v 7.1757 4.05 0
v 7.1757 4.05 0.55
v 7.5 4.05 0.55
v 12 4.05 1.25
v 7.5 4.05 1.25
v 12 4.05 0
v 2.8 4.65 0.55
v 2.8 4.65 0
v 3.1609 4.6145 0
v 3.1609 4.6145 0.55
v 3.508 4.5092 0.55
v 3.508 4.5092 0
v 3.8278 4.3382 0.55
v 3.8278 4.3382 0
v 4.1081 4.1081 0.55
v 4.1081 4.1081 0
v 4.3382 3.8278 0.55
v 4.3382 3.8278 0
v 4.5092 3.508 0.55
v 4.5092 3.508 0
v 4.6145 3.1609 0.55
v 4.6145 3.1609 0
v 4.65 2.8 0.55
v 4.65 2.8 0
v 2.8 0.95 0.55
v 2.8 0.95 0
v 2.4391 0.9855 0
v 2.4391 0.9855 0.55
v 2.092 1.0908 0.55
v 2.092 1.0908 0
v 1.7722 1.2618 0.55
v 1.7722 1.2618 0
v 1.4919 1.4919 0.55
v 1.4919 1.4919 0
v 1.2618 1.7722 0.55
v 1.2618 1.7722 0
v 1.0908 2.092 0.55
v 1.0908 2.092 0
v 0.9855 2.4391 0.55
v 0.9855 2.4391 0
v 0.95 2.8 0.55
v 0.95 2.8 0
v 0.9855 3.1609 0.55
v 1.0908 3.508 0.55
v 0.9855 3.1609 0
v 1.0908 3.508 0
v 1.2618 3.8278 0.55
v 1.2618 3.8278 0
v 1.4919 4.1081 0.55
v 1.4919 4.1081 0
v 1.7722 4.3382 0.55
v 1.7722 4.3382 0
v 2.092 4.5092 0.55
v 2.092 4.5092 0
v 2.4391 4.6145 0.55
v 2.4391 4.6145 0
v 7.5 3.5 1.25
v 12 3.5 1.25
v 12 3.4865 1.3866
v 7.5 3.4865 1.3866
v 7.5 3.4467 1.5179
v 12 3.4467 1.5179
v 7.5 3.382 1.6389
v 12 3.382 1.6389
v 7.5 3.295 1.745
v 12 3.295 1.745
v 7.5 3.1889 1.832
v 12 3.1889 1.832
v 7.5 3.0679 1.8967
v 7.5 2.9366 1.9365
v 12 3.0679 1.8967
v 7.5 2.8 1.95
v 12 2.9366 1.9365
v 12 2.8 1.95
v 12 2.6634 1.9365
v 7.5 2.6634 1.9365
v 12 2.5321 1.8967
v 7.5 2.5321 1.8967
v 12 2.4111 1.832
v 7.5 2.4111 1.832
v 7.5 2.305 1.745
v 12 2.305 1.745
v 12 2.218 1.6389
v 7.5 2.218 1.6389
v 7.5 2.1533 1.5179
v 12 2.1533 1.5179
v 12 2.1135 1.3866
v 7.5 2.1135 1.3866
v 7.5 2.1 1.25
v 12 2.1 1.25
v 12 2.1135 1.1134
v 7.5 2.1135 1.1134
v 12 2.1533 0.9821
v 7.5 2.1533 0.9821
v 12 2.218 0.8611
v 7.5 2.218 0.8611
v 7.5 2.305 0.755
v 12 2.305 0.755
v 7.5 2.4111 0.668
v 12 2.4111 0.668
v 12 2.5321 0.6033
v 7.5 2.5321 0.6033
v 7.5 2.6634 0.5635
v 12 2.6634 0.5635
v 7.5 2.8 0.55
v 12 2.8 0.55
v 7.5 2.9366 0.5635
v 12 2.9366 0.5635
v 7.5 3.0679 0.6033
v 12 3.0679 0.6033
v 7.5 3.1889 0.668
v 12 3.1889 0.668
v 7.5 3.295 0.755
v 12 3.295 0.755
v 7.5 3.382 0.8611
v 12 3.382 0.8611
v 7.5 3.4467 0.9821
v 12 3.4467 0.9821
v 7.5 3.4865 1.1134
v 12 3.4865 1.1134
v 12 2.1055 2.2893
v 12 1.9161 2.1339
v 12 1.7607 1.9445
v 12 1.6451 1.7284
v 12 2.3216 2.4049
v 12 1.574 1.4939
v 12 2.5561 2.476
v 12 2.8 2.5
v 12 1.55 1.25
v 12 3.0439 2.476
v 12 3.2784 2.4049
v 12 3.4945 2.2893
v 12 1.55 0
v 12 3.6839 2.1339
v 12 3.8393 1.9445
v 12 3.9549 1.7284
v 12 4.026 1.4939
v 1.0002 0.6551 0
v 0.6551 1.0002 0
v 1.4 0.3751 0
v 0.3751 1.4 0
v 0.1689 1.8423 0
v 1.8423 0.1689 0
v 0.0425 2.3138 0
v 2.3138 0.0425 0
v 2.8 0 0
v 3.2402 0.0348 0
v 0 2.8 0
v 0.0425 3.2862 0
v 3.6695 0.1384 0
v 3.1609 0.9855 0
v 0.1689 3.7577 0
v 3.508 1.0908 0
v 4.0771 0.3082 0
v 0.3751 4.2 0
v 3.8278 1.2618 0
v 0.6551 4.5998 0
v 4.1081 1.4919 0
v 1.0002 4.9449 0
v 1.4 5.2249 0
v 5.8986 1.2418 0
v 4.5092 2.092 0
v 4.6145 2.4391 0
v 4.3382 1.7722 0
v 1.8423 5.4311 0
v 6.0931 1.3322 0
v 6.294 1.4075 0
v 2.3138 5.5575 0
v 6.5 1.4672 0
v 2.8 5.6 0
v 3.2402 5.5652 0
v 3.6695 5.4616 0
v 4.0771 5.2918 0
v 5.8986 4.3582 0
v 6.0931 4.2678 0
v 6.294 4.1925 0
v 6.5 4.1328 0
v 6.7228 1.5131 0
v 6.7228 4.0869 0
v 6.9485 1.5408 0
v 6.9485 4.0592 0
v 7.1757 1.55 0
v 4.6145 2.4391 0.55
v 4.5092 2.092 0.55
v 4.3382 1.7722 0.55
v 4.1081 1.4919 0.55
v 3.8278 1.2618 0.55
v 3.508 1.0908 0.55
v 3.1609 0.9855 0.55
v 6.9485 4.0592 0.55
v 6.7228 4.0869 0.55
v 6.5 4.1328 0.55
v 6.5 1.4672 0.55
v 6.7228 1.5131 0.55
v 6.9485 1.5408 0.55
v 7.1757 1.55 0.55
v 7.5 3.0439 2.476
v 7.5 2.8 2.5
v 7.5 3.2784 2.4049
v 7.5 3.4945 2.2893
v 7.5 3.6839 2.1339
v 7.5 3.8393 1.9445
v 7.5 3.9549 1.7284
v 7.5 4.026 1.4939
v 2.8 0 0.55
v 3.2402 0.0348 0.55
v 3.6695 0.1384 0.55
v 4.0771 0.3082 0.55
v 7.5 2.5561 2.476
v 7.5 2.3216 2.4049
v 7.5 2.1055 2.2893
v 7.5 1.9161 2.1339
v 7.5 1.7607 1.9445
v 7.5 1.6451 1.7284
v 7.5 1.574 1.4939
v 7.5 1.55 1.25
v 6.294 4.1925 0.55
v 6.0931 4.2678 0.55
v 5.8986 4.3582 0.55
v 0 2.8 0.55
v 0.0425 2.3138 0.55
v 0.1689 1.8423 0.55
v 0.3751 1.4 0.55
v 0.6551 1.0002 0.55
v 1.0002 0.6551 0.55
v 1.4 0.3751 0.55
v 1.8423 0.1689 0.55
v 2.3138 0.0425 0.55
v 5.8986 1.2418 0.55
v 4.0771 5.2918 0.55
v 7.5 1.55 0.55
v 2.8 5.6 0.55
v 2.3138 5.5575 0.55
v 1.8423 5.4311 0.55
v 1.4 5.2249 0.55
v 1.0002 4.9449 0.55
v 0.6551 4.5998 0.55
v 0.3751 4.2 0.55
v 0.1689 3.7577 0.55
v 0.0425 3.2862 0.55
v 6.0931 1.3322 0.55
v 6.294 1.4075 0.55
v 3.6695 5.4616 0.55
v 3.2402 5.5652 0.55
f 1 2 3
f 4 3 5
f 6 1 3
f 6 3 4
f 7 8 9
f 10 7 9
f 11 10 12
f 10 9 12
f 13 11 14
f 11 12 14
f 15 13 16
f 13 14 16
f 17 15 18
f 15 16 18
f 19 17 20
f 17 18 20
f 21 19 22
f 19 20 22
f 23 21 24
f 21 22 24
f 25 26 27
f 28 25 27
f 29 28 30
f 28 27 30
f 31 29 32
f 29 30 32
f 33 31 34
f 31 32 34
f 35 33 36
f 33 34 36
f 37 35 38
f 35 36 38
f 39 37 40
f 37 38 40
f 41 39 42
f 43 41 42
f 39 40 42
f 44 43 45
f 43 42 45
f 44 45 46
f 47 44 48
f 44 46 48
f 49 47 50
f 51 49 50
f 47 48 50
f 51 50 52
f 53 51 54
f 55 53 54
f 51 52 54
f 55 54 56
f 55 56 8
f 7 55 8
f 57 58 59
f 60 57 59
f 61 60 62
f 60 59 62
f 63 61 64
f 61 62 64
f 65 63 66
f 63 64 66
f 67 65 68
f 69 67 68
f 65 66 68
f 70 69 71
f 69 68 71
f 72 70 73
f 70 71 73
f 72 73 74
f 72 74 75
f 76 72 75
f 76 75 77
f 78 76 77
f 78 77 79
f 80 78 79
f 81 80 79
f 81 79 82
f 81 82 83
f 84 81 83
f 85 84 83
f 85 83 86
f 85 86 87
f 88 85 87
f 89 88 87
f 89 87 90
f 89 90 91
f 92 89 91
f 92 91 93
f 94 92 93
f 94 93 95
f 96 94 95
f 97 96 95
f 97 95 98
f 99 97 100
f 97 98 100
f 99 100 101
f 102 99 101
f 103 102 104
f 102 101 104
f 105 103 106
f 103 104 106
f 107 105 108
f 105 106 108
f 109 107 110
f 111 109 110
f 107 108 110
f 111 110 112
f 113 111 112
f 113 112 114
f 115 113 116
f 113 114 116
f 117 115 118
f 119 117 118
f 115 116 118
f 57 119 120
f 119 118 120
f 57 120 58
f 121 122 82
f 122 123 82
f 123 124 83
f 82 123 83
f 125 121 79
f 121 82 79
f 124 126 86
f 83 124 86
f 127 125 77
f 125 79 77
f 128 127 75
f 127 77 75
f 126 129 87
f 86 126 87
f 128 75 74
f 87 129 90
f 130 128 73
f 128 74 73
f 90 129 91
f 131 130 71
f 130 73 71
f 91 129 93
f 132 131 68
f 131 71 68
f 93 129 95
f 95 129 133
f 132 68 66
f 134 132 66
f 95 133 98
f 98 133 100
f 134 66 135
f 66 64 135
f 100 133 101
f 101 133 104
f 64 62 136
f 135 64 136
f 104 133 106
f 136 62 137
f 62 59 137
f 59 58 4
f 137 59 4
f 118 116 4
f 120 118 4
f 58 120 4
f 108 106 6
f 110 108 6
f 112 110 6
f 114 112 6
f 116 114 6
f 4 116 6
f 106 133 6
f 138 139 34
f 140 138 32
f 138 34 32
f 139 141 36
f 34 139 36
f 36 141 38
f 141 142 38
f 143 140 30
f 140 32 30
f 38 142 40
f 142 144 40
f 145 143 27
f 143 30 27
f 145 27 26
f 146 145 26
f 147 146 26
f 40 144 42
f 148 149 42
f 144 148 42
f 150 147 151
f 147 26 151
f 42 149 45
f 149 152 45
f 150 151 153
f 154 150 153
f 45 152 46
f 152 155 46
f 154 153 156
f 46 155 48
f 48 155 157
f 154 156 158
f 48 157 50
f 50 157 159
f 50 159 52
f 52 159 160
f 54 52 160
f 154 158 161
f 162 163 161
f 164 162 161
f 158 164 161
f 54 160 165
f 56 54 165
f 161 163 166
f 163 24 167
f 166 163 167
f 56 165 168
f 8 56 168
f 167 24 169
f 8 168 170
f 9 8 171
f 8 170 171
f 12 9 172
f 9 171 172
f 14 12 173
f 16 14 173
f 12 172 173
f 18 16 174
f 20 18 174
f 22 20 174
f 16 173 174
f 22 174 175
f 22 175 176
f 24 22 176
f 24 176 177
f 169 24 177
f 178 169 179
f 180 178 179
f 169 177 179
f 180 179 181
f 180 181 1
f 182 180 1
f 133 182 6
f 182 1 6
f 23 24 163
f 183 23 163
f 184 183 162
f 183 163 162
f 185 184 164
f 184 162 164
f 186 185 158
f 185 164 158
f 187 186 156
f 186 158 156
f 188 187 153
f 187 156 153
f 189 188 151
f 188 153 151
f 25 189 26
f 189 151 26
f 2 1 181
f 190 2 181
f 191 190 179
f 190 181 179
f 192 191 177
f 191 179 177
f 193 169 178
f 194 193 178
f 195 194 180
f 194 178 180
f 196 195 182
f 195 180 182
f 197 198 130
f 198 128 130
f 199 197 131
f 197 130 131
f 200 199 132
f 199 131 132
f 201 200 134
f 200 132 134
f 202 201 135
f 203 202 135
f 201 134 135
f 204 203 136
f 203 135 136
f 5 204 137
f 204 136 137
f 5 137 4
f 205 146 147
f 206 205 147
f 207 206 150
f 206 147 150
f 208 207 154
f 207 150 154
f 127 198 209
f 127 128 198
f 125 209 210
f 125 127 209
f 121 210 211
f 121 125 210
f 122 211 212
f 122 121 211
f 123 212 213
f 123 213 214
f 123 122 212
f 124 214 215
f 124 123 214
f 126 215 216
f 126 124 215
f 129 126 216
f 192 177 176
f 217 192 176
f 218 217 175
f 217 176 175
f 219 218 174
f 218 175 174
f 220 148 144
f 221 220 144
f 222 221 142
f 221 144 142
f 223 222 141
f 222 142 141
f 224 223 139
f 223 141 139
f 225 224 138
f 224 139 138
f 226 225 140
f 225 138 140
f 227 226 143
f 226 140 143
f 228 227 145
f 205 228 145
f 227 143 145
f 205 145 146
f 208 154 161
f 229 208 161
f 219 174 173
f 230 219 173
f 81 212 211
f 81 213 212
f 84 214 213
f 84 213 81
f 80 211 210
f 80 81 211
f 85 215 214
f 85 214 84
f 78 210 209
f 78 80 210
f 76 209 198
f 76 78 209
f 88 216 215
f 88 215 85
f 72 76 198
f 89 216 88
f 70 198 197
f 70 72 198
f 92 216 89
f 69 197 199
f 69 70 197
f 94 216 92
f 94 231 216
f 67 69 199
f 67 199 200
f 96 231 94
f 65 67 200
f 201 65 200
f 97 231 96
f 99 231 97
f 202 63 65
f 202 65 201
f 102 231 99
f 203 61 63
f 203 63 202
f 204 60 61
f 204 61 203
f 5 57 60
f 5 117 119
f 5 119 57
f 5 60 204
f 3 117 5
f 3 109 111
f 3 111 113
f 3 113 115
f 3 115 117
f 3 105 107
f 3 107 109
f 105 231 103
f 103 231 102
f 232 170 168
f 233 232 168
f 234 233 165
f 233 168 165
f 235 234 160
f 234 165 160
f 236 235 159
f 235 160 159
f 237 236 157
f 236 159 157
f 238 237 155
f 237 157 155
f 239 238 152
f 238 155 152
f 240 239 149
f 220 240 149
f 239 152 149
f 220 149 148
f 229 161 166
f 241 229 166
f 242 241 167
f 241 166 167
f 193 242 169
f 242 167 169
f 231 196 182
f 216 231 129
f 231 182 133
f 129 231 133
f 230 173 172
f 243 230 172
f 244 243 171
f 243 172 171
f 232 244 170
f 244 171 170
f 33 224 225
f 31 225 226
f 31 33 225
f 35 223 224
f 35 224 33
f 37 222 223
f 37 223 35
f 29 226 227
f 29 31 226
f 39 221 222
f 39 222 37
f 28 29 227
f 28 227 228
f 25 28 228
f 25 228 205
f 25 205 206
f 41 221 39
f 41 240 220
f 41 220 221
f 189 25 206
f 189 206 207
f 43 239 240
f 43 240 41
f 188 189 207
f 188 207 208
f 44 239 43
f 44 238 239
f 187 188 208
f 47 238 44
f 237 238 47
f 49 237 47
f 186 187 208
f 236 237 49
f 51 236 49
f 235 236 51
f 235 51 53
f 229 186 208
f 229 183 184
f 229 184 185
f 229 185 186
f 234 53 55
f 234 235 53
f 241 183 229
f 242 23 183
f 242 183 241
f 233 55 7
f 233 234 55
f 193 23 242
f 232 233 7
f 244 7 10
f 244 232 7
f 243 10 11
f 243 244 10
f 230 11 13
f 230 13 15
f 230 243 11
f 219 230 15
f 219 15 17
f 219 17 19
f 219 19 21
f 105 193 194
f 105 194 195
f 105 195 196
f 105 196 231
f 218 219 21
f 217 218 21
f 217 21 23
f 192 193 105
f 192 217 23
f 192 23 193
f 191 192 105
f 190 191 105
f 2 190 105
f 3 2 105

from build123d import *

# Parameters (mm, degrees)
F1_DEPTH = 0.55
F2_W     = 4.5
F2_H     = 2.5
F3_DEPTH = 1.95
F4_R     = 1.24999
F5_R     = 0.7
F6_DEPTH = 25


# Not quite as in the source:
# - a fillet or chamfer is up to 0.001 mm smaller than in the source, because OpenCascade refuses the exact size


with BuildPart() as f1:
    # F0 (on Top) → F1 (new body)
    with BuildSketch(Plane.XY):
        with BuildLine():
            Line((7.1757397782, 1.55), (12, 1.55))
            Line((12, 1.55), (12, 4.05))
            Line((12, 4.05), (7.1757397782, 4.05))
            ThreePointArc((7.1757397782, 4.05), (6.8353451552, 4.0707678217), (6.5, 4.1327632138))
            ThreePointArc((6.5, 4.1327632138), (6.1928359056, 4.2281876541), (5.8986420809, 4.3582091838))
            Line((5.8986420809, 4.3582091838), (4.0770976972, 5.2917908162))
            ThreePointArc((4.0770976972, 5.2917908162), (3.4568811592, 5.5218572965), (2.8, 5.6))
            Line((2.8, 5.6), (2.8, 4.65))
            ThreePointArc((2.8, 4.65), (4.1081475452, 4.1081475452), (4.65, 2.8))
            ThreePointArc((4.65, 2.8), (4.1081475452, 1.4918524548), (2.8, 0.95))
            Line((2.8, 0.95), (2.8, 0))
            ThreePointArc((2.8, 0), (3.4568811592, 0.0781427035), (4.0770976972, 0.3082091838))
            Line((4.0770976972, 0.3082091838), (5.8986420809, 1.2417908162))
            ThreePointArc((5.8986420809, 1.2417908162), (6.1928359056, 1.3718123459), (6.5, 1.4672367862))
            ThreePointArc((6.5, 1.4672367862), (6.8353451552, 1.5292321783), (7.1757397782, 1.55))
        make_face()
        with BuildLine():
            ThreePointArc((0, 2.8), (0.8201010127, 0.8201010127), (2.8, 0))
            Line((2.8, 0), (2.8, 0.95))
            ThreePointArc((2.8, 0.95), (0.95, 2.8), (2.8, 4.65))
            Line((2.8, 4.65), (2.8, 5.6))
            ThreePointArc((2.8, 5.6), (0.8201010127, 4.7798989873), (0, 2.8))
        make_face()
    extrude(amount=F1_DEPTH)

    # F2 (on face) → F3 (join)
    with BuildSketch(Plane.XY.offset(0.55)):
        with Locations((9.75, 2.8)):
            Rectangle(F2_W, F2_H)
    extrude(amount=F3_DEPTH)

    # F4 (radius 1.25 in the source; OpenCascade refuses exactly that, so slightly less here)
    f4_edges = [f1.edges().sort_by_distance(p)[0] for p in [
        (9.75, 4.05, 2.5),
        (9.75, 1.55, 2.5),
    ]]
    fillet(f4_edges, radius=F4_R)

    # F5 (on face) → F6 (cut)
    with BuildSketch(Plane.YZ.offset(12)):
        with Locations((2.8, 1.25)):
            Circle(F5_R)
    extrude(amount=-F6_DEPTH, mode=Mode.SUBTRACT)


solid = f1.part
